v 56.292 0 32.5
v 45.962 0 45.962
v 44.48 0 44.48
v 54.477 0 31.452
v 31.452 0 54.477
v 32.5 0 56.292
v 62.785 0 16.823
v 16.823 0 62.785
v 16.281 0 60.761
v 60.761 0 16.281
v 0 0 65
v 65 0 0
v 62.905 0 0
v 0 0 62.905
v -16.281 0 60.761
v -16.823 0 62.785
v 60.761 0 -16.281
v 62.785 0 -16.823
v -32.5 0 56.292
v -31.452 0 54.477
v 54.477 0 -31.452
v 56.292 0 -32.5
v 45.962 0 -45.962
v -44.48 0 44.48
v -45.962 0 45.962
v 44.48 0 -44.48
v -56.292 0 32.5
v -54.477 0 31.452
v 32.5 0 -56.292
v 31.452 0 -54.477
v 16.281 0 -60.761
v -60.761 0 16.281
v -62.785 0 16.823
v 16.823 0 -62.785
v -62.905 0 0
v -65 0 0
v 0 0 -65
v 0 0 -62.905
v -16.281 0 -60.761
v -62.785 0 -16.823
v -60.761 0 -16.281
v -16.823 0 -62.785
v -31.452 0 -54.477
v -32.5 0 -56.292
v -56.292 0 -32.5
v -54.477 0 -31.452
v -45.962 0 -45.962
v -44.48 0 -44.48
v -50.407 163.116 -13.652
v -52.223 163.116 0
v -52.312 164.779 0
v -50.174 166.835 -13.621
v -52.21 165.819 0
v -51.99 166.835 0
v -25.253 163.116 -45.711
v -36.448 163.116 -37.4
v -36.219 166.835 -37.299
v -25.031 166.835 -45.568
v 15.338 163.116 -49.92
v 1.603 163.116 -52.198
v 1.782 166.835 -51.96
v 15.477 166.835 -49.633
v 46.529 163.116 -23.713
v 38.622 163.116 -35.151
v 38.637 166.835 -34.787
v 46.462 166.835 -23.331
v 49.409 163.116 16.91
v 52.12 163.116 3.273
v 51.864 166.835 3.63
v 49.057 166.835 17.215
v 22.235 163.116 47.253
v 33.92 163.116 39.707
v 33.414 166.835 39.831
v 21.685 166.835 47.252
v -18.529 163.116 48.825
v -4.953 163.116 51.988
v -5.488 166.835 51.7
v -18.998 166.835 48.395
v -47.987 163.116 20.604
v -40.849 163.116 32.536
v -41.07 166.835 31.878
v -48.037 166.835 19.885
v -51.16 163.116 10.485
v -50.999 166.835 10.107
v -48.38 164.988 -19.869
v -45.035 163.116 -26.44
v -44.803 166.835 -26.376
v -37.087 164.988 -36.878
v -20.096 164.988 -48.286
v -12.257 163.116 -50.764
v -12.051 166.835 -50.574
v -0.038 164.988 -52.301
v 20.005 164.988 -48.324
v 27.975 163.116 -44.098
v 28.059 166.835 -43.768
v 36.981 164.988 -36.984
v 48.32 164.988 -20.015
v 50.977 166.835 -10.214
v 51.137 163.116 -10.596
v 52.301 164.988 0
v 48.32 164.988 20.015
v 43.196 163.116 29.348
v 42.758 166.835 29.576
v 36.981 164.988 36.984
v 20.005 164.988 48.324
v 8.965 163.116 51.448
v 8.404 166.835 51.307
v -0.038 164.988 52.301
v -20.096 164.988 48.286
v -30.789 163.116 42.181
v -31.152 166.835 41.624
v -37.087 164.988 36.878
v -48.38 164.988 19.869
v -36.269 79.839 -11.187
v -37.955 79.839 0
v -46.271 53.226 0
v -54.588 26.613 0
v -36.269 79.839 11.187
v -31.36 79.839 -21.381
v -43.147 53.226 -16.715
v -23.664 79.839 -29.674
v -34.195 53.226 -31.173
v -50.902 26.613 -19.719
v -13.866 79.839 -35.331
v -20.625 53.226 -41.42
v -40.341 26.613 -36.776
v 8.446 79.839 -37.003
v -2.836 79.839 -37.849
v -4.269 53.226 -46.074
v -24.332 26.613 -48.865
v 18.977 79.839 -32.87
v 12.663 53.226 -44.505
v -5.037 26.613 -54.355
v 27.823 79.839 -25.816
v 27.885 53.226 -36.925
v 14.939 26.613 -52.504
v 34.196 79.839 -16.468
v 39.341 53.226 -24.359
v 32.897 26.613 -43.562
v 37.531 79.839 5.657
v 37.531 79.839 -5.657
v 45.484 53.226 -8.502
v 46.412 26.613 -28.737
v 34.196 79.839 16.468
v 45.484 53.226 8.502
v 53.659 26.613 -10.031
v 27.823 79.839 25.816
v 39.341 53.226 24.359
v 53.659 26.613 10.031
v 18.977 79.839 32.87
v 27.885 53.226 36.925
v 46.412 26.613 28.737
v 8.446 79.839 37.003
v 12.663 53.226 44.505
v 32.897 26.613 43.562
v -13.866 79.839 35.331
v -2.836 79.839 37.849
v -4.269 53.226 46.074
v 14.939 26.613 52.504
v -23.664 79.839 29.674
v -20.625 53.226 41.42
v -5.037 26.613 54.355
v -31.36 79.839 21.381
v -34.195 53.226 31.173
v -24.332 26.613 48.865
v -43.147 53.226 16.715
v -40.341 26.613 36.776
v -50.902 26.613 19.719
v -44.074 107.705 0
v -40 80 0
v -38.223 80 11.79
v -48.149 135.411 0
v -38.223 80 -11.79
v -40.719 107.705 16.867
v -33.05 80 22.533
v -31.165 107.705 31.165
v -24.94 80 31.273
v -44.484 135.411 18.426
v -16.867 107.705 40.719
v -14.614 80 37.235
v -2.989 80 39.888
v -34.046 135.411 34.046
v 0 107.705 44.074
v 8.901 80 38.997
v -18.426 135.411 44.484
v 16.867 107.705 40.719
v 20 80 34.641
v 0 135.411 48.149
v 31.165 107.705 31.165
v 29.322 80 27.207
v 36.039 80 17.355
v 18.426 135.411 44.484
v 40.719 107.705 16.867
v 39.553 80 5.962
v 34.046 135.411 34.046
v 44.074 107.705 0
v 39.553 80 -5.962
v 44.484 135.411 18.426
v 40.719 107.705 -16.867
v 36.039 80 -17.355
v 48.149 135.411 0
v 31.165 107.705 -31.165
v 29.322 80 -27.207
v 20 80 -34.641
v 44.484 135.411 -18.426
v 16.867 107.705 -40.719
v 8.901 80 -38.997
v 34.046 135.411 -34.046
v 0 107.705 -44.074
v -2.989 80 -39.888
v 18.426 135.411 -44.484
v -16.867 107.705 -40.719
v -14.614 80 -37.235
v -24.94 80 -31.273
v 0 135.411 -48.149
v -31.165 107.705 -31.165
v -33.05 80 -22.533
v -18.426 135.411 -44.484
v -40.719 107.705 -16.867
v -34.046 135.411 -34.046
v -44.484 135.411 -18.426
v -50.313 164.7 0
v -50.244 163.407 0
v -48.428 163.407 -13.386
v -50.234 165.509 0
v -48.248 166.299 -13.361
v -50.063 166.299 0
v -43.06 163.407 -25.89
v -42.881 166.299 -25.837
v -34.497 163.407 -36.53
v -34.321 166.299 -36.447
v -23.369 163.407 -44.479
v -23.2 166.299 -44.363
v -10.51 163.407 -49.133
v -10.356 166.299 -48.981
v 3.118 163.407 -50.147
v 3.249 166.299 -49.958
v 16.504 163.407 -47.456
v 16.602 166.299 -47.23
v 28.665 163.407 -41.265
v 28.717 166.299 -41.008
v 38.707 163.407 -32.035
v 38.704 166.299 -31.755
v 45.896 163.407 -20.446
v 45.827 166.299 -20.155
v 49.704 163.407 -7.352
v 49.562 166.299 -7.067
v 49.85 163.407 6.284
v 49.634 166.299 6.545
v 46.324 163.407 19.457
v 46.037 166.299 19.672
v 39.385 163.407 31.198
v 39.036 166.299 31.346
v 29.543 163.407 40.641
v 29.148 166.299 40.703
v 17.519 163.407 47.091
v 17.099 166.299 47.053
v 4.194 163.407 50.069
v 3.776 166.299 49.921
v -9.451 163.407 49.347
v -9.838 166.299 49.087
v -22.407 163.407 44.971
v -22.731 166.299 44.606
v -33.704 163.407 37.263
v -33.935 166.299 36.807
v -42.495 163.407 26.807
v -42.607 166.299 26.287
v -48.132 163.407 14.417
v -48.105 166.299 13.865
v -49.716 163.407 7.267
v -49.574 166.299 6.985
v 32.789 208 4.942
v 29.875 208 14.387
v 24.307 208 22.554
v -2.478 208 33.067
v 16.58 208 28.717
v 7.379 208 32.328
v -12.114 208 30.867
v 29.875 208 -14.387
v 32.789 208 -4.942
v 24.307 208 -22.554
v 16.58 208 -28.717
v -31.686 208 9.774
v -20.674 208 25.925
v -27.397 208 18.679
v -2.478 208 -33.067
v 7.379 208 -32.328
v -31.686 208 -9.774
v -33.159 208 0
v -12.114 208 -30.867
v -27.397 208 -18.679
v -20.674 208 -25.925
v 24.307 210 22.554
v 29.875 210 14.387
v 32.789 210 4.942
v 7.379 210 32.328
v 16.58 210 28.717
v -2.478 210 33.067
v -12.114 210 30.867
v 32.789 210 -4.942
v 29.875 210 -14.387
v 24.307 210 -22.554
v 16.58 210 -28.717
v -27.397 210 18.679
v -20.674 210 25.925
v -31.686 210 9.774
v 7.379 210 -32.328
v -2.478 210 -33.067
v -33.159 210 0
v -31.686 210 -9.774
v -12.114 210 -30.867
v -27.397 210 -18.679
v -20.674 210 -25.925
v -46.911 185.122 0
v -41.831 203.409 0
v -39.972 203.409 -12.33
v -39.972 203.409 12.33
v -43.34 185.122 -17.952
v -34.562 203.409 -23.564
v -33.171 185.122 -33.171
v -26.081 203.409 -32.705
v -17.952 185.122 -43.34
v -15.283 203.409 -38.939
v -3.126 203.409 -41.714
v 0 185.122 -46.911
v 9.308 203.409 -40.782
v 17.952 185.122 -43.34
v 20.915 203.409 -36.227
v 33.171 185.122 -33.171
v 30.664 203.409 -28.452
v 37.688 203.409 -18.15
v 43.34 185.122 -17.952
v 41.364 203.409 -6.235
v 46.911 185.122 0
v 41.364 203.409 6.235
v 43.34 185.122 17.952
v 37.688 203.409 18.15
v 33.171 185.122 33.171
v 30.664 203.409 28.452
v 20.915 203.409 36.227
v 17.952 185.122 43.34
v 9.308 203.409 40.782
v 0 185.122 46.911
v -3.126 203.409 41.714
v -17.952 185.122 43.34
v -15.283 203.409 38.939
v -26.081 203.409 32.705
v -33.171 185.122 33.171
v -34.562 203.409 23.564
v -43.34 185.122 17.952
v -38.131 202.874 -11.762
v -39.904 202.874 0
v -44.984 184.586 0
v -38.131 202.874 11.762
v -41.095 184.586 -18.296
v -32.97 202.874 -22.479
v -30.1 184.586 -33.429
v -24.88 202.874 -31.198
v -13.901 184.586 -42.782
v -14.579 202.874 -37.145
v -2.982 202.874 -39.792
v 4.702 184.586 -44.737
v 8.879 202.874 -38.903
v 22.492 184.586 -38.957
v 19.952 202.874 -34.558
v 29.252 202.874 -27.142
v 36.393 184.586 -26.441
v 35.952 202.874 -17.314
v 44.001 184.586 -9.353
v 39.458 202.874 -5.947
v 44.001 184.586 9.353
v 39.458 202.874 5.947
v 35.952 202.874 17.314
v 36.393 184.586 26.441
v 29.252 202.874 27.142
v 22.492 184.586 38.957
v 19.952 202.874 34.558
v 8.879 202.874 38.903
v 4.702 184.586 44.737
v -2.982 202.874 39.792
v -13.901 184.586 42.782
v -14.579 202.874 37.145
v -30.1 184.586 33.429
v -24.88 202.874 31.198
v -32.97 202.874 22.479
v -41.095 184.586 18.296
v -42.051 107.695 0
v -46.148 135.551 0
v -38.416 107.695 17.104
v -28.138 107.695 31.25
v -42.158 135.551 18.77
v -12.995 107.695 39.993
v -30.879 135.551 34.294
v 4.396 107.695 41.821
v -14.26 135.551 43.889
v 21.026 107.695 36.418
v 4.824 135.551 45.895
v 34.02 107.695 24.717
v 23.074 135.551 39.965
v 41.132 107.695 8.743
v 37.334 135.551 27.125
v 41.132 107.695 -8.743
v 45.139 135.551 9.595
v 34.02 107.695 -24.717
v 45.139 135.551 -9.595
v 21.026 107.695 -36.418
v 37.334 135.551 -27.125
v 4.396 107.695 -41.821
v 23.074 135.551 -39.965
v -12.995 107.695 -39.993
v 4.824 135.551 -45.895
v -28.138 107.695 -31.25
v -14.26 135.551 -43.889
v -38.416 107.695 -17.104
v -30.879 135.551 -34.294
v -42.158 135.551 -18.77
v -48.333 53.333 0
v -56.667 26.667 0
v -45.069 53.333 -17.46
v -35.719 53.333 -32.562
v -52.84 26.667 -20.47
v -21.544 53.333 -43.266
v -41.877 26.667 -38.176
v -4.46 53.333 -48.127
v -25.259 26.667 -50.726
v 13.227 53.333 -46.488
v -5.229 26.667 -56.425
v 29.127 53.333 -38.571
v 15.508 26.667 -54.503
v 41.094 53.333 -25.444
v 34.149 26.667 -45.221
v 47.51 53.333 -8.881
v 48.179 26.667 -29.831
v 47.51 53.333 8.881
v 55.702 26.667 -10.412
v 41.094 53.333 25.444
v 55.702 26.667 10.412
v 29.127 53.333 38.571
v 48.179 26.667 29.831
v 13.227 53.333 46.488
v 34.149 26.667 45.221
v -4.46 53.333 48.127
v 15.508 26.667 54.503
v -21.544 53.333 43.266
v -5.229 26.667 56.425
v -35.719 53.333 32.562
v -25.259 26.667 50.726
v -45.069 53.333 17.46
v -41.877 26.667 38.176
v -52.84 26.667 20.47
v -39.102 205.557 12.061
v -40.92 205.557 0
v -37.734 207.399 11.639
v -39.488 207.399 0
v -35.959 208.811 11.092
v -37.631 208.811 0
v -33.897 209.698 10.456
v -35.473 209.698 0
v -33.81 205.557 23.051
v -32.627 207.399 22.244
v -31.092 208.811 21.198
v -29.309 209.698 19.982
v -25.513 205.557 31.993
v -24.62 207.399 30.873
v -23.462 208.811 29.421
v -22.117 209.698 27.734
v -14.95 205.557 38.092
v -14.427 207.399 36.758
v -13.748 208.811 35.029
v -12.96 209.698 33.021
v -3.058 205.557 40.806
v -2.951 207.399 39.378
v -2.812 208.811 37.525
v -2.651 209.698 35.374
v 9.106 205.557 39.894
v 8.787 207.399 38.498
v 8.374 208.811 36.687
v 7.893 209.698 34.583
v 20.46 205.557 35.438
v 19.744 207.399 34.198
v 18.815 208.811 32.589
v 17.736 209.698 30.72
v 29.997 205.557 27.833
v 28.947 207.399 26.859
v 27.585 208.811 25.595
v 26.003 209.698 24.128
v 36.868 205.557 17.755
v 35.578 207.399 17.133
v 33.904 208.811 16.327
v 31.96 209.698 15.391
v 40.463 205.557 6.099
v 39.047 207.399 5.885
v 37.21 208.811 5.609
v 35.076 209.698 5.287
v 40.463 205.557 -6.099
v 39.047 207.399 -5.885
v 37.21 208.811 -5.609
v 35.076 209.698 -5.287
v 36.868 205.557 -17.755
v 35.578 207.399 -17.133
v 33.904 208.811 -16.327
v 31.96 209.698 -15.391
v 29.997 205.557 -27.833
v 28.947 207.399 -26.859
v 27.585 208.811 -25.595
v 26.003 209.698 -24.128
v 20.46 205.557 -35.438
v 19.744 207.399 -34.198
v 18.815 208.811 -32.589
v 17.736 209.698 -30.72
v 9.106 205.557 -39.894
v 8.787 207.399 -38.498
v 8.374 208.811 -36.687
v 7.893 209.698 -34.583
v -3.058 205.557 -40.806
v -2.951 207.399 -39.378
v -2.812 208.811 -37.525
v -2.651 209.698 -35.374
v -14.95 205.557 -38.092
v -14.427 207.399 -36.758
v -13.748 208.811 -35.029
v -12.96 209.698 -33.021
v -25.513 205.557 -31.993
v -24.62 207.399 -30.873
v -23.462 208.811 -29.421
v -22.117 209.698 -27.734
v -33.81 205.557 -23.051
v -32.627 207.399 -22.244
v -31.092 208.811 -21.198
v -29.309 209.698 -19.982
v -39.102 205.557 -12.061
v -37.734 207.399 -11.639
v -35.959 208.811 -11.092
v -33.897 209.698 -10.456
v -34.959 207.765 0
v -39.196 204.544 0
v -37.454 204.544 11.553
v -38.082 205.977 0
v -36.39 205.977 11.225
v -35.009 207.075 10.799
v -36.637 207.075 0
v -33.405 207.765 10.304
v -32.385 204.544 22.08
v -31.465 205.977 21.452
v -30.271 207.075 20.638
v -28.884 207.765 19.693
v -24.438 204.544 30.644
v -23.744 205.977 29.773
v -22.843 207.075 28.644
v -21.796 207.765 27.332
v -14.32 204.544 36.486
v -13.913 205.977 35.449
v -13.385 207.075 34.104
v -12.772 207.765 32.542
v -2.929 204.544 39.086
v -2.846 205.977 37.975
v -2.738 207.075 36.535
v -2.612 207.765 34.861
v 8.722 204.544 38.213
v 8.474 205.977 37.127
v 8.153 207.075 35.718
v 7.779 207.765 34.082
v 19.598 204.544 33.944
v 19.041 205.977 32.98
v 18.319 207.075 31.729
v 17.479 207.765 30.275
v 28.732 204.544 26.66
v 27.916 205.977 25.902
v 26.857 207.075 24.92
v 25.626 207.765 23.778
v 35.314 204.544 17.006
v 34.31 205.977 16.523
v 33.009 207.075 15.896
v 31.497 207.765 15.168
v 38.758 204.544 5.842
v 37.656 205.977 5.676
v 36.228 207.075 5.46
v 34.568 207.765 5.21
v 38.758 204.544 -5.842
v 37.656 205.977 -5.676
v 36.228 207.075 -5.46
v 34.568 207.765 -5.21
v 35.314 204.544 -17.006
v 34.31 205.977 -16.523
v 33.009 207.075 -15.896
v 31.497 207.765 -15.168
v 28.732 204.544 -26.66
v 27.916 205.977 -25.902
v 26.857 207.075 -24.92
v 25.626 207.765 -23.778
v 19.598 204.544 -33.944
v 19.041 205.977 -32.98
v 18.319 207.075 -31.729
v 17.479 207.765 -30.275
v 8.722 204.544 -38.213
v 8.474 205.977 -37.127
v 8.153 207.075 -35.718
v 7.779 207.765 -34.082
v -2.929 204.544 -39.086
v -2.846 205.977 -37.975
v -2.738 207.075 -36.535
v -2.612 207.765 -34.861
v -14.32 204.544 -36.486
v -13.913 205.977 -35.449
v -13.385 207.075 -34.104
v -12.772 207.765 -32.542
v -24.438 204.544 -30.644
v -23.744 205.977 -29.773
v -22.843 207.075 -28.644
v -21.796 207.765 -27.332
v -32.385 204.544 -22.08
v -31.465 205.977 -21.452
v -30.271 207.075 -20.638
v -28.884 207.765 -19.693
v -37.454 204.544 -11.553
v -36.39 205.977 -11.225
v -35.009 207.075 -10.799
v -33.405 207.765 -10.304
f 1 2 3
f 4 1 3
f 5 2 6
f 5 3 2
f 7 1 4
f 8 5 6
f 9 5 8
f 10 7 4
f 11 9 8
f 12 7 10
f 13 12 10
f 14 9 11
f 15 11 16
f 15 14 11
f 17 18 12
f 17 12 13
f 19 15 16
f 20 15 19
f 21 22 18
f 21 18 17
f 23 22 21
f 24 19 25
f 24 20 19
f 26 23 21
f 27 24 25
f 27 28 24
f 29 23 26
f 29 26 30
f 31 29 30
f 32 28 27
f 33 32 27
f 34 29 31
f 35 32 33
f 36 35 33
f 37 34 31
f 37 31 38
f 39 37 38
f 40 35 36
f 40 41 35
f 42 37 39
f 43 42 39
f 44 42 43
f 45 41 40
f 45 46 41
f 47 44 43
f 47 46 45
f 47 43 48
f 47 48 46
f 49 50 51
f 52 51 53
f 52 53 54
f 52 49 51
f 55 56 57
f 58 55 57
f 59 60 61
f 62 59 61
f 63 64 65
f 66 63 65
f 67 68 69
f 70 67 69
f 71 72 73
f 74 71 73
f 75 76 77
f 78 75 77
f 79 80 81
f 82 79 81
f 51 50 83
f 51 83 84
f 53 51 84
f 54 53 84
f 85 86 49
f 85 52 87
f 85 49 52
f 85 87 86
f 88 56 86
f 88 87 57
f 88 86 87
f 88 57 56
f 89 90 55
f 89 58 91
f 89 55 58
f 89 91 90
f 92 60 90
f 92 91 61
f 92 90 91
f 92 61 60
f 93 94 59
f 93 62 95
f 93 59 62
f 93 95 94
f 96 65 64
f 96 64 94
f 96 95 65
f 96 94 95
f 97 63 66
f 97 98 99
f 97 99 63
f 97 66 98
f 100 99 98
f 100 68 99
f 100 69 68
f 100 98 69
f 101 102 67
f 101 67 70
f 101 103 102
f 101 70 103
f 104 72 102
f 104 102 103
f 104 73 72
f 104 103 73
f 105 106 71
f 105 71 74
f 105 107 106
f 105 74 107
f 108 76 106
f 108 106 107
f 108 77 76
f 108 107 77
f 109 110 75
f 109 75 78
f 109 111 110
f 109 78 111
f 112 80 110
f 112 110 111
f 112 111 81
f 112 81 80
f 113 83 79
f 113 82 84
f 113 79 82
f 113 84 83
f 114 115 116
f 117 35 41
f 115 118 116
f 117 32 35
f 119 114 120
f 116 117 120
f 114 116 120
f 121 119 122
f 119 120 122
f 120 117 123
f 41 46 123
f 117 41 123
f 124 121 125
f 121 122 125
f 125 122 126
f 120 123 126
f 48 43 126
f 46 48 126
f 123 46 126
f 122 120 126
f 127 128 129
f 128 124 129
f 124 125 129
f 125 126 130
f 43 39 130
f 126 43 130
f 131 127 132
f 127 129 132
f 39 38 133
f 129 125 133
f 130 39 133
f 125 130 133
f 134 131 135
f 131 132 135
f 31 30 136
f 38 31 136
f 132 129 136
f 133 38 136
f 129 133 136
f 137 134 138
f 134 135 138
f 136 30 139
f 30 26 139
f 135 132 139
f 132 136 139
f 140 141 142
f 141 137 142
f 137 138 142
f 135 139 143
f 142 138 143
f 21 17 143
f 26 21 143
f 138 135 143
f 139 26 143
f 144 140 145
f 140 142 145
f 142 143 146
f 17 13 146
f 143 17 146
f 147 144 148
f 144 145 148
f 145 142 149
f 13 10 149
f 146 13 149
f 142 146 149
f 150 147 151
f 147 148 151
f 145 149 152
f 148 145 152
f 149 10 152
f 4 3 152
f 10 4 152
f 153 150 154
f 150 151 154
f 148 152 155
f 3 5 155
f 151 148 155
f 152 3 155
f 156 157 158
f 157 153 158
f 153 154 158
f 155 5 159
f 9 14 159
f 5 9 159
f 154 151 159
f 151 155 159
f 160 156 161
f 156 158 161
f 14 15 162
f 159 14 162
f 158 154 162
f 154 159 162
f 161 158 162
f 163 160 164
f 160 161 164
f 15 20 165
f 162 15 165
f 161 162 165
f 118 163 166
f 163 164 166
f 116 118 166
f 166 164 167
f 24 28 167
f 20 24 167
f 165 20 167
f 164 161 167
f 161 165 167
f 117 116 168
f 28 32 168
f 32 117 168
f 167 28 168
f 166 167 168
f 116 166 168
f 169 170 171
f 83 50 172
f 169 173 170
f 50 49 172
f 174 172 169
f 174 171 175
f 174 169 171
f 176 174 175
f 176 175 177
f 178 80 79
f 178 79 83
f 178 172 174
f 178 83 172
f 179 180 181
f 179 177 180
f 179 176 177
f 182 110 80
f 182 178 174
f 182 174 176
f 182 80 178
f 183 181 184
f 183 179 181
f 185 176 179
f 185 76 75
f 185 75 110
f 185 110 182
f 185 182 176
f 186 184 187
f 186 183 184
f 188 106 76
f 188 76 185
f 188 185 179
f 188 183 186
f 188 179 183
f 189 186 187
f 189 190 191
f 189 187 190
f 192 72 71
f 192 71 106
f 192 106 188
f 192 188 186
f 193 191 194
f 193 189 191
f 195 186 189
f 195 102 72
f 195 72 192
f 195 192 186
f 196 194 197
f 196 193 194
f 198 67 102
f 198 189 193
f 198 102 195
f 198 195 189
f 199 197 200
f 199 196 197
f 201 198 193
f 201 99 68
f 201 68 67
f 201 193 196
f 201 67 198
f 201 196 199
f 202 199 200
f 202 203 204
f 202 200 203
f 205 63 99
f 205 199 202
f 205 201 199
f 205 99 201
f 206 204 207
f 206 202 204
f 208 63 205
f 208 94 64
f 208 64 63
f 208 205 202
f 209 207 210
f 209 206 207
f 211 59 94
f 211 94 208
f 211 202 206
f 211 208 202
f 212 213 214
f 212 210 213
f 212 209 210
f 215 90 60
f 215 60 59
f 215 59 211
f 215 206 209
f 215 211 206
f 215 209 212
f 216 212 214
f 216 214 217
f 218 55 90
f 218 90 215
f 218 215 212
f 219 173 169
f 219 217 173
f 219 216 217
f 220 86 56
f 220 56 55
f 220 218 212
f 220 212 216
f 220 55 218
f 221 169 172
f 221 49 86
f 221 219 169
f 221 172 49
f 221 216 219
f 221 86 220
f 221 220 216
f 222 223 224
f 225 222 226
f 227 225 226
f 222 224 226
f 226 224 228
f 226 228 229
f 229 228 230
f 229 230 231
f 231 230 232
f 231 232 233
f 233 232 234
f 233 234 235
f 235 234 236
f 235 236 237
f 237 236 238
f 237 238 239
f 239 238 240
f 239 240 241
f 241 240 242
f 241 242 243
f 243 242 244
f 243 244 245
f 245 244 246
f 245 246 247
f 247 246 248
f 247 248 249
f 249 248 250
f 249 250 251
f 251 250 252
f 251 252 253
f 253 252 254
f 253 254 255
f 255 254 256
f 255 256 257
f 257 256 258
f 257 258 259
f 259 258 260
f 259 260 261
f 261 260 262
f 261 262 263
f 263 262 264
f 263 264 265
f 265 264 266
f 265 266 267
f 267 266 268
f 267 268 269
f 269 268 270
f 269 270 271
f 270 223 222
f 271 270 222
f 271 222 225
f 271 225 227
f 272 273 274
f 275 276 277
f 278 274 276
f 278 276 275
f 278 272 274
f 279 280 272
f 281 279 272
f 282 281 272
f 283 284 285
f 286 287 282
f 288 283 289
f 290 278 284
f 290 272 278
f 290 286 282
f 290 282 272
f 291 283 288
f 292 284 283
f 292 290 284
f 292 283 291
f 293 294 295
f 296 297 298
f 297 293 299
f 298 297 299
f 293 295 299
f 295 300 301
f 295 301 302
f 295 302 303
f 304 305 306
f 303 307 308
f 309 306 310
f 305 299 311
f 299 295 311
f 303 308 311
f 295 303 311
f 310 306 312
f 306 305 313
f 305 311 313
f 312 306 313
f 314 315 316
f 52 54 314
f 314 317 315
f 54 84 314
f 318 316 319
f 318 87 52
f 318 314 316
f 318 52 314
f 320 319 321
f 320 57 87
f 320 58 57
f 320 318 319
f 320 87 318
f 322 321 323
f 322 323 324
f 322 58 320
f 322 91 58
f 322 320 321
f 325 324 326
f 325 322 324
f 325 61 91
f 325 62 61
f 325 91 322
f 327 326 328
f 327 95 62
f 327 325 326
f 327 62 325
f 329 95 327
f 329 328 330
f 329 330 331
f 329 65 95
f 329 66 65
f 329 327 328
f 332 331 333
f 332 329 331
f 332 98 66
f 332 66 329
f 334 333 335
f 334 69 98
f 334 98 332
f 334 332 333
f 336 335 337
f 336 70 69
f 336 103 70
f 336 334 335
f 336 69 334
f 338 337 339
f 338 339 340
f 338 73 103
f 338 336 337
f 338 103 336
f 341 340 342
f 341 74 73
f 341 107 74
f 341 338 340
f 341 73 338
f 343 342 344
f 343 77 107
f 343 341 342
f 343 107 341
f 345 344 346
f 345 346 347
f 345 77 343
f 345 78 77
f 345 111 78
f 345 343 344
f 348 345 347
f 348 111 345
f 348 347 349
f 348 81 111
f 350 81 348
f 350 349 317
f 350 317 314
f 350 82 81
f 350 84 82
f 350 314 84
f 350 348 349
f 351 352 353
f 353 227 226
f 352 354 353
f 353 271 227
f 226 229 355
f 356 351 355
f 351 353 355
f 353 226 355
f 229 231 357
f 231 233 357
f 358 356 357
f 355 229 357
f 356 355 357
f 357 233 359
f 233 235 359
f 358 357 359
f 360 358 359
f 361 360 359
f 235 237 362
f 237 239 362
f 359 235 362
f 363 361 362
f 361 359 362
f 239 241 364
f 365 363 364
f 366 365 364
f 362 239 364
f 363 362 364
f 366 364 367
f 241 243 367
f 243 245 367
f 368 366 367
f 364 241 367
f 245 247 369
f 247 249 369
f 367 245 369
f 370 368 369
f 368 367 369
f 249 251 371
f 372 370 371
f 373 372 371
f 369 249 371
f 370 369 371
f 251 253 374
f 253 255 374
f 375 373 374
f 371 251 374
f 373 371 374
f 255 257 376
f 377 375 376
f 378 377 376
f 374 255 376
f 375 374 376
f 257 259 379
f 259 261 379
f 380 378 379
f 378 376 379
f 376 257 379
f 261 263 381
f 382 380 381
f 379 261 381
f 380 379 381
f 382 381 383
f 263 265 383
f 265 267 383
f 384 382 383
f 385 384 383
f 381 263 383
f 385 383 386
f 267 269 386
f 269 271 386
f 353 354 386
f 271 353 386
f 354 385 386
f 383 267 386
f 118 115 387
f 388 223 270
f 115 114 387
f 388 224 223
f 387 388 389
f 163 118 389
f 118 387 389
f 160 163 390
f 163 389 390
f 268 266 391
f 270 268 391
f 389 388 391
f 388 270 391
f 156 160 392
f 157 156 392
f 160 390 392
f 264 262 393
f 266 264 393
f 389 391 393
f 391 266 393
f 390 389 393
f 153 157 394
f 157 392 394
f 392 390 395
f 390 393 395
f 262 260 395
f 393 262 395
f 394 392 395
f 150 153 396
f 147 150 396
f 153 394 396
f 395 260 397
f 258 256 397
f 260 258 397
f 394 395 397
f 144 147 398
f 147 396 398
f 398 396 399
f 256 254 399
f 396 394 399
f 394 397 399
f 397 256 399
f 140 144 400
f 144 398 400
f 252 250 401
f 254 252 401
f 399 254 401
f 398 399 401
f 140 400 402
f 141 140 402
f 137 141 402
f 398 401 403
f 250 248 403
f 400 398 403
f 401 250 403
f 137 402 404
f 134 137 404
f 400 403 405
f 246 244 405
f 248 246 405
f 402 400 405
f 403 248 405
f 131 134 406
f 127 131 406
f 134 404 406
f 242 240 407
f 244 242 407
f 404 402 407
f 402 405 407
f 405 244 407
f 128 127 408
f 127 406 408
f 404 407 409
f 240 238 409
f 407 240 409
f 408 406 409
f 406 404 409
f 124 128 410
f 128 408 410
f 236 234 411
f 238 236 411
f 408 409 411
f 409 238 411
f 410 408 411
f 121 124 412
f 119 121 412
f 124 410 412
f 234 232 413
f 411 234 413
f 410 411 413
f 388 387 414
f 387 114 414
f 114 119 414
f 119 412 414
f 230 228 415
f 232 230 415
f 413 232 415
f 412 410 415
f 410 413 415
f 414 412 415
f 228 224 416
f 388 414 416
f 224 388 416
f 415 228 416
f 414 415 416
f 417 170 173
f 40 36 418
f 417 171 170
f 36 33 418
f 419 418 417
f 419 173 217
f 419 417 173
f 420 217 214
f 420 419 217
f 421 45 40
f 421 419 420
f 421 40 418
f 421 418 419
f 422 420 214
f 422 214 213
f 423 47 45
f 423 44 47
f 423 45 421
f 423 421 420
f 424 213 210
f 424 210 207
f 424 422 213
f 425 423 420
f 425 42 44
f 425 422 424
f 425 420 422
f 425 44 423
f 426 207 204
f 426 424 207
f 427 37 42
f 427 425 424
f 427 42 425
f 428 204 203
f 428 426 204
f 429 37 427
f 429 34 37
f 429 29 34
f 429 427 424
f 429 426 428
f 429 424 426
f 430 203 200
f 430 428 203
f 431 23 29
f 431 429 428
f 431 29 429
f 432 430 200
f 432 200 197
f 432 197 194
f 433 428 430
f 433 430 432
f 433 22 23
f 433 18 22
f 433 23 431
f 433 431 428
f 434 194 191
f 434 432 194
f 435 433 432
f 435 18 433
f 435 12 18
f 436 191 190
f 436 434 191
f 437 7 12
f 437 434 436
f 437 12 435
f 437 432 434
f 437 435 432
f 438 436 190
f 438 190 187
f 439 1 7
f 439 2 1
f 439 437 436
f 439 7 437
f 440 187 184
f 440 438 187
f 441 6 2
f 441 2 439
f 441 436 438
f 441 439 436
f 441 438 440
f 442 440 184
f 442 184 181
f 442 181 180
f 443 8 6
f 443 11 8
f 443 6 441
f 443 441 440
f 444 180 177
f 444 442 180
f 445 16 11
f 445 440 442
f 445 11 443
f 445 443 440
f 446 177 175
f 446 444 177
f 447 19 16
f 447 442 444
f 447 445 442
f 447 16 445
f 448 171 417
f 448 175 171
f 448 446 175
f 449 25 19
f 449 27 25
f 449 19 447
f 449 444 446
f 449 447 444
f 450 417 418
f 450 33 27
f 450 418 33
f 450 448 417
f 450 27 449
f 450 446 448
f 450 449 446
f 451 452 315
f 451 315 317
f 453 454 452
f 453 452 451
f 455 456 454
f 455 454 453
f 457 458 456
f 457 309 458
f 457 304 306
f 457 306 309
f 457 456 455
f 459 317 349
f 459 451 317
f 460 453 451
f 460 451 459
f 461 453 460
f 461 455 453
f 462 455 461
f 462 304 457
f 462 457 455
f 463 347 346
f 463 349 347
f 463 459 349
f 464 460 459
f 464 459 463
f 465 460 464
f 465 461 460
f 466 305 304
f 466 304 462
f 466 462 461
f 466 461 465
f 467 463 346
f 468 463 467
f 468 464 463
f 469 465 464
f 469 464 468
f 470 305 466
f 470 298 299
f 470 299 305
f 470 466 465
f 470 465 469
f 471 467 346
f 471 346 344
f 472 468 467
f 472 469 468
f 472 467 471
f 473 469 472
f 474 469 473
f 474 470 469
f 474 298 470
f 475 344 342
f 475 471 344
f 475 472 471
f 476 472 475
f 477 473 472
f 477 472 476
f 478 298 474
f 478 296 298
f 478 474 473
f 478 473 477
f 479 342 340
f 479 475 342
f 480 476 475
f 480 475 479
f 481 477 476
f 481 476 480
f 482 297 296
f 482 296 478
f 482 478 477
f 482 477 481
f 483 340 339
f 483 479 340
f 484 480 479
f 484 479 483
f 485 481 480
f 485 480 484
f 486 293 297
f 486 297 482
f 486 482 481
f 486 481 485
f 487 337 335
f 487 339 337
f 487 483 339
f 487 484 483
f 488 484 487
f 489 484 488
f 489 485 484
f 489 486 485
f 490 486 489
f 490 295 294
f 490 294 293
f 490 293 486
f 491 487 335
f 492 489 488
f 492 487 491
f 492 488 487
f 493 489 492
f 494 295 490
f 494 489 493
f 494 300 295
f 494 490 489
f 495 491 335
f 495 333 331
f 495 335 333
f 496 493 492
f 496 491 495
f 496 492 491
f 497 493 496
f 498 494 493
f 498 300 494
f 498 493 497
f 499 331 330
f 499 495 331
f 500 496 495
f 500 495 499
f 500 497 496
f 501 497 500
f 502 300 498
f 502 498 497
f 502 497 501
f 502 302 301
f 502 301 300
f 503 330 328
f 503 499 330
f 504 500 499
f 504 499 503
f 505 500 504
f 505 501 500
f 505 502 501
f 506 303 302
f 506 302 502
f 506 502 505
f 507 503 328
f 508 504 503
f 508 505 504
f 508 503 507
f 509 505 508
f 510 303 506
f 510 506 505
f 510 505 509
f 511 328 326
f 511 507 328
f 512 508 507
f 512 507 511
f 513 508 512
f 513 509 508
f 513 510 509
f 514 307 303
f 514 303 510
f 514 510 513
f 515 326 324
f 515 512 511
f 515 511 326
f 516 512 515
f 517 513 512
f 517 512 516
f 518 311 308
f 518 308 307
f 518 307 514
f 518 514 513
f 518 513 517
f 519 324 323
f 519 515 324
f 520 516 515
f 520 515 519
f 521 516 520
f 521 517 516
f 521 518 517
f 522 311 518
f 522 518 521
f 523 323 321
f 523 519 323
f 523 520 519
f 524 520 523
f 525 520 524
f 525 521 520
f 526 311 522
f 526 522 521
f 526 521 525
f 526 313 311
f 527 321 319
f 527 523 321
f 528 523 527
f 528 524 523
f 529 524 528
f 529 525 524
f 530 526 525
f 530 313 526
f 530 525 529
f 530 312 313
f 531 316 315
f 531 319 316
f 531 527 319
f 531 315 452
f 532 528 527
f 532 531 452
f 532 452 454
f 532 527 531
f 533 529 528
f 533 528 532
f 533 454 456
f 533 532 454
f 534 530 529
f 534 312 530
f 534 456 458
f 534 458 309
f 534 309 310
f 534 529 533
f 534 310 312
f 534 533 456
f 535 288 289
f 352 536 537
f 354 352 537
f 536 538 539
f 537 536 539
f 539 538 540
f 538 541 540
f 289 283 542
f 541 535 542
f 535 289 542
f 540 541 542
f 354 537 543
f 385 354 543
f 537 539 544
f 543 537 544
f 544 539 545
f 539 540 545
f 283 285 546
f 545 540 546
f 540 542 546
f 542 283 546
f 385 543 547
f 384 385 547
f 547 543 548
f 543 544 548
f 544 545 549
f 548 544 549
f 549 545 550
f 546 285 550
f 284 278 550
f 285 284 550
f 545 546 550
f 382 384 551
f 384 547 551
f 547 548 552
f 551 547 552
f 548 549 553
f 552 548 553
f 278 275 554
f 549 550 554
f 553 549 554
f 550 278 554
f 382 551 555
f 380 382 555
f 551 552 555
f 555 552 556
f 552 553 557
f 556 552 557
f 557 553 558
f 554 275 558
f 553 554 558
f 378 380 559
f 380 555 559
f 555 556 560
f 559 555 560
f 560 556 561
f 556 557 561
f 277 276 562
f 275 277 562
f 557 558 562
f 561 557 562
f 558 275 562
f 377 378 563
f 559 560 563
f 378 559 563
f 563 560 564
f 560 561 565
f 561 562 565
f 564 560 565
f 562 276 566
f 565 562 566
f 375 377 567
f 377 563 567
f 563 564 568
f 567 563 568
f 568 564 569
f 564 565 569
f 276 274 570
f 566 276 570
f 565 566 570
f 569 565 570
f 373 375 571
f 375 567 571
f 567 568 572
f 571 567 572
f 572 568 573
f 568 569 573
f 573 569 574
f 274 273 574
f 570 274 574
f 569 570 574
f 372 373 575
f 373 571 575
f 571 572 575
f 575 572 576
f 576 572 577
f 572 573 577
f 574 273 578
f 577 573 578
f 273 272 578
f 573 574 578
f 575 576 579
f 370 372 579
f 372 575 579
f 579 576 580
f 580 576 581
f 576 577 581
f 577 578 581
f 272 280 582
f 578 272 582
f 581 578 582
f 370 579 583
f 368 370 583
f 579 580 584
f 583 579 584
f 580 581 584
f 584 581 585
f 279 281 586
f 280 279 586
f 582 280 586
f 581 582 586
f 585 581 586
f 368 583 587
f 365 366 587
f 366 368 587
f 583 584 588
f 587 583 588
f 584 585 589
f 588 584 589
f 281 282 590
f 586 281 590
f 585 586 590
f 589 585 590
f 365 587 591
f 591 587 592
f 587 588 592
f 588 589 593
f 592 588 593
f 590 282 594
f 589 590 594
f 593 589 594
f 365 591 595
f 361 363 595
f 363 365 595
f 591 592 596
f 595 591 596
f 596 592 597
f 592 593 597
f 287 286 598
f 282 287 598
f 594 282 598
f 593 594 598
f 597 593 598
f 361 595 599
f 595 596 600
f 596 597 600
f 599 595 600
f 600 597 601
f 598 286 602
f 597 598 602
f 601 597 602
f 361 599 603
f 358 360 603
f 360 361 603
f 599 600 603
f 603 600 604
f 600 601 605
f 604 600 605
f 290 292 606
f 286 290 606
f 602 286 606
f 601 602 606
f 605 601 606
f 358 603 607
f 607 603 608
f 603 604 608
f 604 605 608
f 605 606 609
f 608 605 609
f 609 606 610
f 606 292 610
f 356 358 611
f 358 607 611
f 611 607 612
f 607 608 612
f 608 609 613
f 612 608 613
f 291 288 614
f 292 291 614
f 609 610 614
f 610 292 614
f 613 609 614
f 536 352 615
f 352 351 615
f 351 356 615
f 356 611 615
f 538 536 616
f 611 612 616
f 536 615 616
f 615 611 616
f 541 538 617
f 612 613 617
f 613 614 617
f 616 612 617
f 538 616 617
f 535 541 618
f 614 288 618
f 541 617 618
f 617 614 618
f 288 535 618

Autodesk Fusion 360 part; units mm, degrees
sketch "Esquisse1" plane through (0, 0, 0) normal (0, 0, 1) x (1, 0, 0)
  line L0 (0, 0) -> (-65, 0)
  line L1 (-65, 0) -> (-40, 80)
  line L2 (-40, 80) -> (-52.5, 165)
  line L3 (-52.5, 165) -> (-40, 210)
  line L4 (-40, 210) -> (0, 210)
  line L5 (0, 210) -> (0, 0)
  dimension "d1" = 65
  dimension "d3" = 45
  dimension "d4" = 85
  dimension "d5" = 80
  dimension "d6" = 40
  dimension "d7" = 52.5
  dimension "d8" = 40
revolve "Révolution1" add sketch "Esquisse1" angle 360 about axis through (0, 210, 0) along (0, -1, 0)
fillet "Congé1" radius 9 1 edges at (-48.9472, 165, 18.9848)
fillet "Congé2" radius 9 1 edges at (-37.2931, 210, 14.4646)
shell "Coque1" thickness 2 removed faces 1 at (20.2416, 0, -0.2148)
